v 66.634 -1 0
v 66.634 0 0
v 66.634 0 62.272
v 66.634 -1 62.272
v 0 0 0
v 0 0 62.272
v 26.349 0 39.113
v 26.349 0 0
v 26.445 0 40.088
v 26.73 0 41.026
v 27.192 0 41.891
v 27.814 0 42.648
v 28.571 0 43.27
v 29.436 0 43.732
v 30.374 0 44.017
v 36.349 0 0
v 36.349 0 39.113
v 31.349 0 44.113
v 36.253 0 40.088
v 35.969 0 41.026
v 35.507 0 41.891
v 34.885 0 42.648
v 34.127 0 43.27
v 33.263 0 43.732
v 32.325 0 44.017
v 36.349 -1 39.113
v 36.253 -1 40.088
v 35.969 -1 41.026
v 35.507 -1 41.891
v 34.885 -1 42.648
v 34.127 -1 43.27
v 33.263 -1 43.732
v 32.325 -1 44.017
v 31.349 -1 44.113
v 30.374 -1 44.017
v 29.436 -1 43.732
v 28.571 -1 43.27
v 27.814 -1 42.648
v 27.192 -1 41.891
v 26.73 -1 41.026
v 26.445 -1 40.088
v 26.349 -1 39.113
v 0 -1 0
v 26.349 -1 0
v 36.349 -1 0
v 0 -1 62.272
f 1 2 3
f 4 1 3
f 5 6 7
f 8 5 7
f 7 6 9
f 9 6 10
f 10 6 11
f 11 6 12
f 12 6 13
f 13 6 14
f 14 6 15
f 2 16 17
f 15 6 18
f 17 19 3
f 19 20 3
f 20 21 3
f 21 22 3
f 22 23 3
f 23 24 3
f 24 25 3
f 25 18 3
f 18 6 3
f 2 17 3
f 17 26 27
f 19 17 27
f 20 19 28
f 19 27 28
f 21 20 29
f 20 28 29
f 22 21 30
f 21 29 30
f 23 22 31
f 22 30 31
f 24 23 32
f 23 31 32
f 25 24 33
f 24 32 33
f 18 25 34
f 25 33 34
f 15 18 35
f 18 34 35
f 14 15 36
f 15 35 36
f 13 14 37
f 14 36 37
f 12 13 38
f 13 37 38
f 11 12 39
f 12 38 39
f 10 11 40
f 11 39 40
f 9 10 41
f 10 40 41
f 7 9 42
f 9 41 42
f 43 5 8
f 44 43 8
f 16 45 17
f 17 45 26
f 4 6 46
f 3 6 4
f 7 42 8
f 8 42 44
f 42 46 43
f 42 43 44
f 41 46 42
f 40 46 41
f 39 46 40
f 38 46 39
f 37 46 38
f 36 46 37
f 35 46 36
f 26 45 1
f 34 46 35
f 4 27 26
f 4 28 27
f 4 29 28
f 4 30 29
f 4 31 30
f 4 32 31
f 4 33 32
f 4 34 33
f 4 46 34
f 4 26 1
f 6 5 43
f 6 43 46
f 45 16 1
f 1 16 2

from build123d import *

# Parameters (mm, degrees)
F0_W     = 66.633955
F0_H     = 62.271908
F1_DEPTH = 1
F3_DEPTH = 1.001


with BuildPart() as f1:
    # F0 (on Front) → F1 (new body)
    with BuildSketch(Plane.XZ):
        with Locations((33.316978, 31.135954)):
            Rectangle(F0_W, F0_H)
    extrude(amount=F1_DEPTH)

    # F2 (on face) → F3 (cut, through all)
    with BuildSketch(Plane.XZ.offset(1)):
        with BuildLine():
            Line((31.349327, 0), (36.349327, 0))
            Line((36.349327, 0), (36.349327, 39.112926))
            ThreePointArc((36.349327, 39.112926), (31.349327, 44.112926), (26.349327, 39.112926))
            Line((26.349327, 39.112926), (26.349327, 0))
            Line((26.349327, 0), (31.349327, 0))
        make_face()
    extrude(amount=-F3_DEPTH, mode=Mode.SUBTRACT)


solid = f1.part
